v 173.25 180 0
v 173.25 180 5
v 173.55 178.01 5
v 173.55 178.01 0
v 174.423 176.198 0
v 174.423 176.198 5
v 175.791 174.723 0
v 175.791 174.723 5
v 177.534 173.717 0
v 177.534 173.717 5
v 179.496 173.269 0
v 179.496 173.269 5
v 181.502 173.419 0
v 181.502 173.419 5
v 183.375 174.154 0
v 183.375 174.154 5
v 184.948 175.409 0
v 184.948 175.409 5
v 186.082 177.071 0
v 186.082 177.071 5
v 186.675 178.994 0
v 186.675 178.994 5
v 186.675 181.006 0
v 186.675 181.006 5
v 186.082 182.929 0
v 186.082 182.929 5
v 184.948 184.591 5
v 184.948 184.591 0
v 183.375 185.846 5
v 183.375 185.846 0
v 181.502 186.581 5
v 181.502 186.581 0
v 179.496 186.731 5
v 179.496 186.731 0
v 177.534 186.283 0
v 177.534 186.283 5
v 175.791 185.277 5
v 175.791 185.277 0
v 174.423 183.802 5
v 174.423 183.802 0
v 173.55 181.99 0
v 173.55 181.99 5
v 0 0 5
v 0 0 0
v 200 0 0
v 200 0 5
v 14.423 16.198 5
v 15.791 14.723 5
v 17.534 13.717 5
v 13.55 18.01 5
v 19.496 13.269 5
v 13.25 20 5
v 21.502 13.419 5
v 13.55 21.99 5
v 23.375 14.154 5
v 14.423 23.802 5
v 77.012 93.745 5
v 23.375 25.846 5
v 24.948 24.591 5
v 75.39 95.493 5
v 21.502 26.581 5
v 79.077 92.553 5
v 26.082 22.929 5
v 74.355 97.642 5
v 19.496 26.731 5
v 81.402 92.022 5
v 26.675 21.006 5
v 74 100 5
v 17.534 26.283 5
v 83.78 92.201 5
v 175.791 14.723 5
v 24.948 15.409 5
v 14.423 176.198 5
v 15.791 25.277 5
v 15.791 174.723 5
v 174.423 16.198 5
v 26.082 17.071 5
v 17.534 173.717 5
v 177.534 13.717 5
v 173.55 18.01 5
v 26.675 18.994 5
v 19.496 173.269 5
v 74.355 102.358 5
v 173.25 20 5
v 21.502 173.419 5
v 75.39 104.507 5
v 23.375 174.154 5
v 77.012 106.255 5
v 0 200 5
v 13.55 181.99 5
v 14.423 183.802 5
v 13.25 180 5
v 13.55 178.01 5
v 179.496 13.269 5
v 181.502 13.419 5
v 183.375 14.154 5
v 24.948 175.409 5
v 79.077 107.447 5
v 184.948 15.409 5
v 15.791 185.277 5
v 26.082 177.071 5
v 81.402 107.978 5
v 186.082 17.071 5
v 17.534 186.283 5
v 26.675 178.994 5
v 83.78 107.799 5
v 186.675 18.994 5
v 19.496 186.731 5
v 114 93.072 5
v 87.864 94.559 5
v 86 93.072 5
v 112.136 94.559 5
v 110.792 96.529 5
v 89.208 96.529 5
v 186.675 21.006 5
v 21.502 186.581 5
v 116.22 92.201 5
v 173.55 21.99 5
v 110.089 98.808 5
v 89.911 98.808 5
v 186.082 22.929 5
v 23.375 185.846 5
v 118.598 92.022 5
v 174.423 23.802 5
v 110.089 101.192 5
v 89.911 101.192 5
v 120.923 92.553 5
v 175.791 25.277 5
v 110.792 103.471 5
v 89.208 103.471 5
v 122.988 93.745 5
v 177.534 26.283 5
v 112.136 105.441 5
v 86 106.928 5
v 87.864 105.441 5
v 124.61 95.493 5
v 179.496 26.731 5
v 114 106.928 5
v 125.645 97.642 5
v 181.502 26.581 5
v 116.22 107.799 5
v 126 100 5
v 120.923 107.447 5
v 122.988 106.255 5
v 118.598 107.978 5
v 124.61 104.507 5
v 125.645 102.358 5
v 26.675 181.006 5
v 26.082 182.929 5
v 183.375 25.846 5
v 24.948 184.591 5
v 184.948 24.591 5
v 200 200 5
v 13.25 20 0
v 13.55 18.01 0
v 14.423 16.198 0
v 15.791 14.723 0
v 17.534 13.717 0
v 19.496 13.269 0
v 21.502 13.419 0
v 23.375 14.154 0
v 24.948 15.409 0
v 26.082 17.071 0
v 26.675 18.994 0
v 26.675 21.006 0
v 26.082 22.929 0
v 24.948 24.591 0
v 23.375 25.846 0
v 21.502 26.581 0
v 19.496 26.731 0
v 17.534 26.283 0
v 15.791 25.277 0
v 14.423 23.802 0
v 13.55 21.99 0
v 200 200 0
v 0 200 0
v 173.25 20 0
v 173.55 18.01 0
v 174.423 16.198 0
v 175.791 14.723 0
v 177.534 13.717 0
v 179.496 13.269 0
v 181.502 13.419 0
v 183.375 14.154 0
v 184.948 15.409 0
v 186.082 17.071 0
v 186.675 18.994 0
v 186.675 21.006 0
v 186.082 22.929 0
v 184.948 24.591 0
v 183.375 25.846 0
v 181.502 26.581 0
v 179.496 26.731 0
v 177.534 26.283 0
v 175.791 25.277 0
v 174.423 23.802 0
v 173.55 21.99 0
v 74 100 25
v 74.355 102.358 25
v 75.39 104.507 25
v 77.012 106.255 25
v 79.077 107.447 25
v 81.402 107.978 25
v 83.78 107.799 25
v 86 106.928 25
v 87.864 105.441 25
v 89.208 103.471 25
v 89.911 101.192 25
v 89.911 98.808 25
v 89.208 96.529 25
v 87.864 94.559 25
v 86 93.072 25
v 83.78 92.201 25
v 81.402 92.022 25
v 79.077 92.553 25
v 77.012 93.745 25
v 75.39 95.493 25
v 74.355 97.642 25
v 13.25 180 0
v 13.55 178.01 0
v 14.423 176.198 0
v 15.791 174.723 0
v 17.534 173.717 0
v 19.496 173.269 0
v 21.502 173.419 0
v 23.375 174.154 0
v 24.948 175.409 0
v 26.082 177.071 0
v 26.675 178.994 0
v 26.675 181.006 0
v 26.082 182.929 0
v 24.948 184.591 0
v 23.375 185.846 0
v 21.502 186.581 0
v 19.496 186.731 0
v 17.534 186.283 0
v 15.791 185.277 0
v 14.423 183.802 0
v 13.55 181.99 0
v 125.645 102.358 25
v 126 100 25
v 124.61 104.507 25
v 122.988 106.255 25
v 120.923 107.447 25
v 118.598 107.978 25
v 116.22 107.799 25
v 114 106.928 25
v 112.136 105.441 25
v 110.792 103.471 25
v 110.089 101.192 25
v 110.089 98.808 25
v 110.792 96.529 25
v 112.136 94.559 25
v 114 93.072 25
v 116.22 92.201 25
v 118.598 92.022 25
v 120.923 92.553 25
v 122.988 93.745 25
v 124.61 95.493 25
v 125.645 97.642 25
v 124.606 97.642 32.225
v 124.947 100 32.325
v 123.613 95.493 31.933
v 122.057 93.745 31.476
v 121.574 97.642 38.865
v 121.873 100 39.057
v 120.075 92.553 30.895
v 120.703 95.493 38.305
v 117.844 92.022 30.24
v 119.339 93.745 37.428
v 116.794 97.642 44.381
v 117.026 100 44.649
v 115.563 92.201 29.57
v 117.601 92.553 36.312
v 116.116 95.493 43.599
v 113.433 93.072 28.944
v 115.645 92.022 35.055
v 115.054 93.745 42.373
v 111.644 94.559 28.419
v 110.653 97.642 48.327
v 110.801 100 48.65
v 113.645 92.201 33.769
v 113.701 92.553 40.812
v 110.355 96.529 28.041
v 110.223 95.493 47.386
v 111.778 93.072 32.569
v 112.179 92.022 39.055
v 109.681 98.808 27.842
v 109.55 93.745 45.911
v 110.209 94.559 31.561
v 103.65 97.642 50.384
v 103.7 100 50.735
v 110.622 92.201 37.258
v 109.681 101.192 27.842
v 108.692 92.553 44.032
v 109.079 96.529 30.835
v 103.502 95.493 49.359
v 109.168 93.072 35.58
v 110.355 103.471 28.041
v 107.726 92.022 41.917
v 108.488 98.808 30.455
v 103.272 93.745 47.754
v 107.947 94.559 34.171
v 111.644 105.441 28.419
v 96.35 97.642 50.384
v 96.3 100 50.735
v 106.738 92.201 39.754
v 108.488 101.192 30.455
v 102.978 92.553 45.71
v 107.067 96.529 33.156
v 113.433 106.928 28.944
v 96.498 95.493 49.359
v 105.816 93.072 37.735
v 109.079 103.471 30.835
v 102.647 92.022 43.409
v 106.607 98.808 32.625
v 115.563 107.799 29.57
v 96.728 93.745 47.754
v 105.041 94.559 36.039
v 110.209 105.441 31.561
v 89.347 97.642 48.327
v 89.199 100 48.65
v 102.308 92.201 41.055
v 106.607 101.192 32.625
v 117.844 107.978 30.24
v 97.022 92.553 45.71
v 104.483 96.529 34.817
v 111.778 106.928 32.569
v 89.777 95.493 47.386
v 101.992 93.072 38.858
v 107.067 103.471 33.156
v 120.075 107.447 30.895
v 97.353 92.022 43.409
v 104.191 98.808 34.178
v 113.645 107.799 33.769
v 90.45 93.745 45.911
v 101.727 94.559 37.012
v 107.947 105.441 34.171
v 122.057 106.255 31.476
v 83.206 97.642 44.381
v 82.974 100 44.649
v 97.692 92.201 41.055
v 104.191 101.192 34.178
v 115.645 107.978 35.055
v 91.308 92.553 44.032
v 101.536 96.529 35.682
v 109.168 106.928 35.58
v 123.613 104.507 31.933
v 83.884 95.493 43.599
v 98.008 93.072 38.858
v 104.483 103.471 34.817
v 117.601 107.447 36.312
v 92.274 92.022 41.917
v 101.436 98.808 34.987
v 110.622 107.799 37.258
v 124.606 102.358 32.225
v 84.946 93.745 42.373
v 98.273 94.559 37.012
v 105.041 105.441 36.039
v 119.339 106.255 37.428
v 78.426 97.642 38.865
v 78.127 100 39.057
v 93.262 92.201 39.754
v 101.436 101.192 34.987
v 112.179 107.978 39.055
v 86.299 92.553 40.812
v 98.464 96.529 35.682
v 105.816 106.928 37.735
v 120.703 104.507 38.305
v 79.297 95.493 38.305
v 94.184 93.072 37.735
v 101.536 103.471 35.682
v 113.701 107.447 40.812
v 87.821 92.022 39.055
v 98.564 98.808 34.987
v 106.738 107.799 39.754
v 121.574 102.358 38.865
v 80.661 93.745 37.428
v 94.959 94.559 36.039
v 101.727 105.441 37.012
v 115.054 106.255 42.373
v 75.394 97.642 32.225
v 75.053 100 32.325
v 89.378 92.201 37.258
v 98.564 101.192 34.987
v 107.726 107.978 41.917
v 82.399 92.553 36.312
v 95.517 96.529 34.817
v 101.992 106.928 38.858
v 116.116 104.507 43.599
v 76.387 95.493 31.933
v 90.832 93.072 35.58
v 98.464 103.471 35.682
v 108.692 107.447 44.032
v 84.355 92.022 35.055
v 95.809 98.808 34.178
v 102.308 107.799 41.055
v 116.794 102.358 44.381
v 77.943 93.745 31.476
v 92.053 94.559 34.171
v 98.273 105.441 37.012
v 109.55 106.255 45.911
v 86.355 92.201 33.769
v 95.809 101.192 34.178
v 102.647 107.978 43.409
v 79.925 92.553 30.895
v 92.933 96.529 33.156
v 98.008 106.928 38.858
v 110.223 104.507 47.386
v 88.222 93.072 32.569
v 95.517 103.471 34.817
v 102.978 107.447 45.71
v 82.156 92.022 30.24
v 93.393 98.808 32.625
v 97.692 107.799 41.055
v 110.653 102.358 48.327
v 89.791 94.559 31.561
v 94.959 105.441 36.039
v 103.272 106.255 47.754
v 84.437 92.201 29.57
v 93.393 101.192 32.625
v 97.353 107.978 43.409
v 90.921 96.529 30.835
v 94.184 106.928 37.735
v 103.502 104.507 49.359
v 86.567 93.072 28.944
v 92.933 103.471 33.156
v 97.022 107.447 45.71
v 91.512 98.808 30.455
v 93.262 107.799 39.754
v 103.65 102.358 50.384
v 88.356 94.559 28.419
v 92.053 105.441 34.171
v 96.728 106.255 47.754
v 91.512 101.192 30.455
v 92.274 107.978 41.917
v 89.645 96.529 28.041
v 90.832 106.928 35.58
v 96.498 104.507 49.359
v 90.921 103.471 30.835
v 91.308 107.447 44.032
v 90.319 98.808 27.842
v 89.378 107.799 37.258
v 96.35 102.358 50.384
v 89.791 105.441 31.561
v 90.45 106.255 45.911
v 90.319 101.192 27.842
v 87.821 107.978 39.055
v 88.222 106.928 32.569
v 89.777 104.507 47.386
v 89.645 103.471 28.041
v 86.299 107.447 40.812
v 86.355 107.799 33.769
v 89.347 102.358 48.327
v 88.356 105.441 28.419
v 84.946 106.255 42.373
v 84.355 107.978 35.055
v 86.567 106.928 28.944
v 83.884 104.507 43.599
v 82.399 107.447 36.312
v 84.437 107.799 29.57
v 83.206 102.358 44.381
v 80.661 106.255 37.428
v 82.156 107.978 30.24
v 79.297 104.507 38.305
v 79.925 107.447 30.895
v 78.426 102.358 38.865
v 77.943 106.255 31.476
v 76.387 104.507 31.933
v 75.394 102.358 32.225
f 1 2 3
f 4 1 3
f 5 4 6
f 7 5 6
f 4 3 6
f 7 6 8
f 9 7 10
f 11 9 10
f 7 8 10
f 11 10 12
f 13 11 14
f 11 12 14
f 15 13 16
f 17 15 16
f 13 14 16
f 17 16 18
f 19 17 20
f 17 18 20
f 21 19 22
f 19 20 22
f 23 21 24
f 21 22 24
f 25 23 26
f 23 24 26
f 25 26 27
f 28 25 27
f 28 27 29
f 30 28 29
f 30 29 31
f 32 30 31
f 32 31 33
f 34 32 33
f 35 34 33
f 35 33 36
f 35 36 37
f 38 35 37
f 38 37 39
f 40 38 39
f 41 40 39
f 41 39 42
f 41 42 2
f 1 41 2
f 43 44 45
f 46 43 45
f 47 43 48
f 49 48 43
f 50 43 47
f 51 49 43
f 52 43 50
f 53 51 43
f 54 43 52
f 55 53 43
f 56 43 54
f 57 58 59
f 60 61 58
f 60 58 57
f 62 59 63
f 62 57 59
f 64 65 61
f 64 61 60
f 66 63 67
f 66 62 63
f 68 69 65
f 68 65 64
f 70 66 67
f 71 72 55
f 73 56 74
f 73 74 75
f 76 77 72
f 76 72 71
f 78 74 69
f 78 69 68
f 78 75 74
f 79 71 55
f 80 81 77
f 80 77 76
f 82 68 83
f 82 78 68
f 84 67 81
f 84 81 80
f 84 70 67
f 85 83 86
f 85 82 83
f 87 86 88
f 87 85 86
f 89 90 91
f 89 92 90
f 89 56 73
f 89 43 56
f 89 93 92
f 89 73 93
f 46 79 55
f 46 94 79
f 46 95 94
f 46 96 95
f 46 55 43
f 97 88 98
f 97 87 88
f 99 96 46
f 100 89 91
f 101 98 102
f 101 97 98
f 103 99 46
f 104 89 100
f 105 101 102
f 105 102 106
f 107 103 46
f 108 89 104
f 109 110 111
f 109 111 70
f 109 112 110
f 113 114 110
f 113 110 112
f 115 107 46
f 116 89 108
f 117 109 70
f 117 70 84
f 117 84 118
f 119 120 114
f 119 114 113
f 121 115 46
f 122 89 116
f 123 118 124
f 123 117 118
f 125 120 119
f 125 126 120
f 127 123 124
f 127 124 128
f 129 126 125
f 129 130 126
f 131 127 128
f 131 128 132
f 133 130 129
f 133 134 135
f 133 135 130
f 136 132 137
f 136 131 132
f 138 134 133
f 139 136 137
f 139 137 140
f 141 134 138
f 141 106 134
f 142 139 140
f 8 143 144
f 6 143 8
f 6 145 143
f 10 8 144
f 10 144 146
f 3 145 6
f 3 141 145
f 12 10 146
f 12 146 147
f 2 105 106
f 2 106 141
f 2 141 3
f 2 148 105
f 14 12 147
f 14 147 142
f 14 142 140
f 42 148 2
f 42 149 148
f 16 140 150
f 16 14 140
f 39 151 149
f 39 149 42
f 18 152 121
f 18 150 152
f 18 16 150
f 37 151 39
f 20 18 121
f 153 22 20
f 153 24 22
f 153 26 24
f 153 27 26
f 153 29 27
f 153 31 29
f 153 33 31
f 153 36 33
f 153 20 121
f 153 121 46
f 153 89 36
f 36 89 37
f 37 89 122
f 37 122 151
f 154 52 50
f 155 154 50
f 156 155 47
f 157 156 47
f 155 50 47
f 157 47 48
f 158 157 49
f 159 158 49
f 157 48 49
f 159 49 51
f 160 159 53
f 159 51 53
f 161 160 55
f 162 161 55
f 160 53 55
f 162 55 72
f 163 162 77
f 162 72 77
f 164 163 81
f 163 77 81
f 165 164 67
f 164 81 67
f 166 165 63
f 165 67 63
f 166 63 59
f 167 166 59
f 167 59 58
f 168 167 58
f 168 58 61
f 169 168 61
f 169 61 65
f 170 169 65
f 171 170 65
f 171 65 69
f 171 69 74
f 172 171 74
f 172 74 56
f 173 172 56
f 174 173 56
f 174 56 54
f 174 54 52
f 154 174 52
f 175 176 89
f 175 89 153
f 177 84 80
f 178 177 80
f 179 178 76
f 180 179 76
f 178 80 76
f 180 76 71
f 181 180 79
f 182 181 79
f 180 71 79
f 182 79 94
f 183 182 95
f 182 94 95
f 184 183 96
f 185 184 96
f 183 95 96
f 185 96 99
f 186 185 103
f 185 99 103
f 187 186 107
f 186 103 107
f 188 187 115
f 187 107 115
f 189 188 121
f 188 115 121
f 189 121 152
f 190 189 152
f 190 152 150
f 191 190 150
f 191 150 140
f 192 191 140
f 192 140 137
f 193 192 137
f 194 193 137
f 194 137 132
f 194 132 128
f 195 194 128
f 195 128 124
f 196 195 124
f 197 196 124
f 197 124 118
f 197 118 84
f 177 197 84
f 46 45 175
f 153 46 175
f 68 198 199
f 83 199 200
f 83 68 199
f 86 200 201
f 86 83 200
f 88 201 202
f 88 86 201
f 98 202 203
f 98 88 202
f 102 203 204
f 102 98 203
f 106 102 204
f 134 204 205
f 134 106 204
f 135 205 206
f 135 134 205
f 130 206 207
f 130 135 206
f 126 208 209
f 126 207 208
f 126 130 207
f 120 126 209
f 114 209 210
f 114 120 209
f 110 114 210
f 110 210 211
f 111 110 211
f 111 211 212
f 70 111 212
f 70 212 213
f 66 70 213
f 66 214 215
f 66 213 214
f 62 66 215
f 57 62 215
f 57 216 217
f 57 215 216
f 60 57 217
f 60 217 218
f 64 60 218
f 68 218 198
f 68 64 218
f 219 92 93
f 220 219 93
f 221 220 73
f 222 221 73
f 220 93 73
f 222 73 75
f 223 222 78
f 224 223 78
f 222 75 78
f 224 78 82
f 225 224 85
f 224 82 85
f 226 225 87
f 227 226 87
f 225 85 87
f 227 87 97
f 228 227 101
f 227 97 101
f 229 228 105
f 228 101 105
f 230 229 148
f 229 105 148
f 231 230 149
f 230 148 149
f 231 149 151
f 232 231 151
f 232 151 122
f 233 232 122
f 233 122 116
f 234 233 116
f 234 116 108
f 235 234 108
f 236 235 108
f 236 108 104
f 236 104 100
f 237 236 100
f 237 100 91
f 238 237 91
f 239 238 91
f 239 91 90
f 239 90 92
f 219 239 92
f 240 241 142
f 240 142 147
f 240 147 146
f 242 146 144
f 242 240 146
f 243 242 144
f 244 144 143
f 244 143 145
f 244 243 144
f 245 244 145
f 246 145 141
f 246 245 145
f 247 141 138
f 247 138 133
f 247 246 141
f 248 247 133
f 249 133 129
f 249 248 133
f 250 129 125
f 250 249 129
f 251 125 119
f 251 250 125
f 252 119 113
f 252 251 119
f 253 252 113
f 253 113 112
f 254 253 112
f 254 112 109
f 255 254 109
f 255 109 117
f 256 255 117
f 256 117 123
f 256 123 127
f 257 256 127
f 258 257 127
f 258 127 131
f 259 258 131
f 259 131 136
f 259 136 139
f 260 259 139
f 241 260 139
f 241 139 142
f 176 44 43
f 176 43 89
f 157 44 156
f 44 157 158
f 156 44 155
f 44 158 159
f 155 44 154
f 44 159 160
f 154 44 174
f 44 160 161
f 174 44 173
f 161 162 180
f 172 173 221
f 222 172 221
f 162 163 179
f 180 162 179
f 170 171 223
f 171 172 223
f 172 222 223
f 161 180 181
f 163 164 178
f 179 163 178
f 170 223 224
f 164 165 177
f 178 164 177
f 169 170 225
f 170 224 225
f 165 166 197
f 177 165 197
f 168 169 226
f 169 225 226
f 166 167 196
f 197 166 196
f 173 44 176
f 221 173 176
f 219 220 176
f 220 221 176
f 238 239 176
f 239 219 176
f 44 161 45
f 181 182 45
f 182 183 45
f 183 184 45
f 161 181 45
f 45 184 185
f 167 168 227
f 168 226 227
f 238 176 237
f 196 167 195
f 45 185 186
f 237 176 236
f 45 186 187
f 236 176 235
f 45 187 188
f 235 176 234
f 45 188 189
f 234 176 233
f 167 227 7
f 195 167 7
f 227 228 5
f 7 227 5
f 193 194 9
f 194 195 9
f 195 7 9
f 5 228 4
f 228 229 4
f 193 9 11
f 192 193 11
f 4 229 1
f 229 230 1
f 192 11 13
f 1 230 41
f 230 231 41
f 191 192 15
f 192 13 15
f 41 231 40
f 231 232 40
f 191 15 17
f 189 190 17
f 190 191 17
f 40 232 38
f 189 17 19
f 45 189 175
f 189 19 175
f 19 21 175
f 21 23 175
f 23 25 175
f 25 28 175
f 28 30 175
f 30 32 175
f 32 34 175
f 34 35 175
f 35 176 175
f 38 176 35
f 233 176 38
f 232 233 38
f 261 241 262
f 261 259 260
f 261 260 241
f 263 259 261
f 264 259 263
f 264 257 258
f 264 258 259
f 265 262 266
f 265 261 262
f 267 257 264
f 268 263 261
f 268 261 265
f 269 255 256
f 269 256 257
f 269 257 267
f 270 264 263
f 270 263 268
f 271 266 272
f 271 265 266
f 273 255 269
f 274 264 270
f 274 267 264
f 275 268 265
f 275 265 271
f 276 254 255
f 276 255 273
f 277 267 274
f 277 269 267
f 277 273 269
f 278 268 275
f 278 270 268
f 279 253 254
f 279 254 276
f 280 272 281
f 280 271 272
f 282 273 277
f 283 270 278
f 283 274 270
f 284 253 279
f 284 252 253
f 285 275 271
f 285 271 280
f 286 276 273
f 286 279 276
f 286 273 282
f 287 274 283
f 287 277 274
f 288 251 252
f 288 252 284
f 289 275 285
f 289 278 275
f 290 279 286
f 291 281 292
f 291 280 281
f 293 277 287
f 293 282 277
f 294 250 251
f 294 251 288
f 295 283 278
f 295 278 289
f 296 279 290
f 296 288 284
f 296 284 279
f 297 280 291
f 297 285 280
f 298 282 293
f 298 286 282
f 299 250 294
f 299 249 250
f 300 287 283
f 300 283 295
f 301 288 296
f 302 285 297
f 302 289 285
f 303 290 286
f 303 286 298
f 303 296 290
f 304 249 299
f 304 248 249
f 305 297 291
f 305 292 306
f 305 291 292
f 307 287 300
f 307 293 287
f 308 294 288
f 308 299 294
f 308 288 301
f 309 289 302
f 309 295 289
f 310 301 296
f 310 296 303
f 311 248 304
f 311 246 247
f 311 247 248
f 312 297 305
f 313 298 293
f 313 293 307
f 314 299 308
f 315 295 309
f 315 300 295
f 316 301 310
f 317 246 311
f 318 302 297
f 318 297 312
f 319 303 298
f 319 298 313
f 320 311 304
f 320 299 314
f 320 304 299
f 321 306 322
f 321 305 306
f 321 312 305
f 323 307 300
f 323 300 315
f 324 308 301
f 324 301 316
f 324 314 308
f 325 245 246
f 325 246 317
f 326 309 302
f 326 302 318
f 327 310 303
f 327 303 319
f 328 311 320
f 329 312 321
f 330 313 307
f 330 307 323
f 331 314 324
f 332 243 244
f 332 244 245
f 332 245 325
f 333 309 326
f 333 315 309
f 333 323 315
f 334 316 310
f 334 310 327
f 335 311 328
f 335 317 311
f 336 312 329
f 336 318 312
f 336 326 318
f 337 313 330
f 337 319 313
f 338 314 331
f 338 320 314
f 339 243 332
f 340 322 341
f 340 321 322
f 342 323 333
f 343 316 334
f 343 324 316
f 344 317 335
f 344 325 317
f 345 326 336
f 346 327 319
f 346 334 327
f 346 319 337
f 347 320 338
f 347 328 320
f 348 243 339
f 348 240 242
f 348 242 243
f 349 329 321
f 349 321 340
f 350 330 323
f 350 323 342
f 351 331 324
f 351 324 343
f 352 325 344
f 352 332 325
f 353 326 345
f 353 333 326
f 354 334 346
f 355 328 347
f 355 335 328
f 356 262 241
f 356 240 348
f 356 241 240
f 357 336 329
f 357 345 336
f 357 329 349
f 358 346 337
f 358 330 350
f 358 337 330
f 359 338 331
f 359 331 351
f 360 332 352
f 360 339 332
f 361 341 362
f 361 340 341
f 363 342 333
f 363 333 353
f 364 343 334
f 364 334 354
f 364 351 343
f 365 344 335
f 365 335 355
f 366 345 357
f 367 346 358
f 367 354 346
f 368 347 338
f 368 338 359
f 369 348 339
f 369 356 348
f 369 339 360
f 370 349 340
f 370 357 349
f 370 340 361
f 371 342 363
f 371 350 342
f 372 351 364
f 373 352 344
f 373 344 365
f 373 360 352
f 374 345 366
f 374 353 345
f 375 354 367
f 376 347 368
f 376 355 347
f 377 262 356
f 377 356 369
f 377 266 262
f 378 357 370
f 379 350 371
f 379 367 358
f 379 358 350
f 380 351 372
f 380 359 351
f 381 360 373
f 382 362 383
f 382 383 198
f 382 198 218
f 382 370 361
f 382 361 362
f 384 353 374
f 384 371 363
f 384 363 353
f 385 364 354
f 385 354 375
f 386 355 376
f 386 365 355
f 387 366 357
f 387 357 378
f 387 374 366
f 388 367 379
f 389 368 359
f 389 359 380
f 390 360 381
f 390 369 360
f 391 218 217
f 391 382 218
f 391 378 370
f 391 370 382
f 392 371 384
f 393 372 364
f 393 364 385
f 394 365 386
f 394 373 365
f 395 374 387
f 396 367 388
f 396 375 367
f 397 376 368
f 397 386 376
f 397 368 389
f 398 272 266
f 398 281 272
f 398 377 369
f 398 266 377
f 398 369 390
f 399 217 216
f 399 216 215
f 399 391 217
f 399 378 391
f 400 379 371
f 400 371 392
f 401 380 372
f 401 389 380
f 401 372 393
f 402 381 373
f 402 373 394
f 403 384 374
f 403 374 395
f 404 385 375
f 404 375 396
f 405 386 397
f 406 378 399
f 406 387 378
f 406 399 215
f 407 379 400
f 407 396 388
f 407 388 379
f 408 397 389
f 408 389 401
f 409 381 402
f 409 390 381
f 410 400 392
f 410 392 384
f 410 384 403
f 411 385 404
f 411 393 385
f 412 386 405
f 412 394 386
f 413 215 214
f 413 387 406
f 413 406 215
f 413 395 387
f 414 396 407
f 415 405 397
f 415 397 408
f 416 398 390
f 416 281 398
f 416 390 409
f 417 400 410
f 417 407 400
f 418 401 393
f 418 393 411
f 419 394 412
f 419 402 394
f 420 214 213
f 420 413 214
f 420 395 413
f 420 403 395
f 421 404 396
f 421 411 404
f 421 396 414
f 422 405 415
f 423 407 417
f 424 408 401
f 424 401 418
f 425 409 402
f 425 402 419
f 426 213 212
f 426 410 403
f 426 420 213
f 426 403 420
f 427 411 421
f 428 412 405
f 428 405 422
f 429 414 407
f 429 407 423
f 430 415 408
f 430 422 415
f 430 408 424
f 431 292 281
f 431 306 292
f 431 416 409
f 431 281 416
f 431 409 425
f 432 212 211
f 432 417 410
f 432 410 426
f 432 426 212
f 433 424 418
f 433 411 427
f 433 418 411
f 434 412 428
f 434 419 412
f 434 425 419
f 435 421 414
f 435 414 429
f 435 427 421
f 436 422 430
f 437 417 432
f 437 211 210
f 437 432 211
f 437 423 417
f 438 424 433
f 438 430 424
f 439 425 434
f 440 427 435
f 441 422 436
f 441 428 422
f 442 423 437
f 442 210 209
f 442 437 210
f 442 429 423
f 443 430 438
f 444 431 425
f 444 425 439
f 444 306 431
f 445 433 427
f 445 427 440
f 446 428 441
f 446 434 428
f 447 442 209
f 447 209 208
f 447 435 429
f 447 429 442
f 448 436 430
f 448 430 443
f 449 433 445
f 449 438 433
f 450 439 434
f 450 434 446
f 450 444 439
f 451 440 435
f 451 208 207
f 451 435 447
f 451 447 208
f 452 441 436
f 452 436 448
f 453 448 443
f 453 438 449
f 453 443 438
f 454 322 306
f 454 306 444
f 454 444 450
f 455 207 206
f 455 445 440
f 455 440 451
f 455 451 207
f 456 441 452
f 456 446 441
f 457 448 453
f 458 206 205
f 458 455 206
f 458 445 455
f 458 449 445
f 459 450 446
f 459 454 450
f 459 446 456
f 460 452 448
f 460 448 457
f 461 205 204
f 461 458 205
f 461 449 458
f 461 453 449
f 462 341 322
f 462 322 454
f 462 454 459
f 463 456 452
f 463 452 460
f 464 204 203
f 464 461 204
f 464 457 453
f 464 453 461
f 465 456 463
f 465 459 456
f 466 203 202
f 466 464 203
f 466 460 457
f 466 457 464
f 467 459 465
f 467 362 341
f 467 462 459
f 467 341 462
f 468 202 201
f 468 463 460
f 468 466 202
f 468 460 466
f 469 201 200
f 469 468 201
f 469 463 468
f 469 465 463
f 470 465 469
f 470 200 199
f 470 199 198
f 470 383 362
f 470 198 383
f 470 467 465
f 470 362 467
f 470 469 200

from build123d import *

# Parameters (mm, degrees)
F0_W     = 200
F0_H     = 200
F1_DEPTH = 5
F3_D     = 13.5
F5_R     = 8


with BuildPart() as f1:
    # F0 (on Top) → F1 (new body)
    with BuildSketch(Plane.XY):
        with Locations((100, 100)):
            Rectangle(F0_W, F0_H)
    extrude(amount=F1_DEPTH)

    # F3 (through all)
    with Locations(Plane(origin=(0, 0, 0), x_dir=(1, 0, 0), z_dir=(0, 0, -1))):
        with Locations((20, -20), (180, -20), (20, -180), (180, -180)):
            Hole(F3_D / 2)

    # F8: sweep along a path in F7
    with BuildLine(Plane.XZ.offset(-100)) as f8_path:
        Line((118, 5), (118, 25))
        ThreePointArc((118, 25), (100, 43), (82, 25))
        Line((82, 25), (82, 5))
    # F5 (on face) → F8 (sweep)
    with BuildSketch(Plane.XY.offset(5)):
        with Locations((118, 100)):
            Circle(F5_R)
    sweep(path=f8_path.line)


solid = f1.part
